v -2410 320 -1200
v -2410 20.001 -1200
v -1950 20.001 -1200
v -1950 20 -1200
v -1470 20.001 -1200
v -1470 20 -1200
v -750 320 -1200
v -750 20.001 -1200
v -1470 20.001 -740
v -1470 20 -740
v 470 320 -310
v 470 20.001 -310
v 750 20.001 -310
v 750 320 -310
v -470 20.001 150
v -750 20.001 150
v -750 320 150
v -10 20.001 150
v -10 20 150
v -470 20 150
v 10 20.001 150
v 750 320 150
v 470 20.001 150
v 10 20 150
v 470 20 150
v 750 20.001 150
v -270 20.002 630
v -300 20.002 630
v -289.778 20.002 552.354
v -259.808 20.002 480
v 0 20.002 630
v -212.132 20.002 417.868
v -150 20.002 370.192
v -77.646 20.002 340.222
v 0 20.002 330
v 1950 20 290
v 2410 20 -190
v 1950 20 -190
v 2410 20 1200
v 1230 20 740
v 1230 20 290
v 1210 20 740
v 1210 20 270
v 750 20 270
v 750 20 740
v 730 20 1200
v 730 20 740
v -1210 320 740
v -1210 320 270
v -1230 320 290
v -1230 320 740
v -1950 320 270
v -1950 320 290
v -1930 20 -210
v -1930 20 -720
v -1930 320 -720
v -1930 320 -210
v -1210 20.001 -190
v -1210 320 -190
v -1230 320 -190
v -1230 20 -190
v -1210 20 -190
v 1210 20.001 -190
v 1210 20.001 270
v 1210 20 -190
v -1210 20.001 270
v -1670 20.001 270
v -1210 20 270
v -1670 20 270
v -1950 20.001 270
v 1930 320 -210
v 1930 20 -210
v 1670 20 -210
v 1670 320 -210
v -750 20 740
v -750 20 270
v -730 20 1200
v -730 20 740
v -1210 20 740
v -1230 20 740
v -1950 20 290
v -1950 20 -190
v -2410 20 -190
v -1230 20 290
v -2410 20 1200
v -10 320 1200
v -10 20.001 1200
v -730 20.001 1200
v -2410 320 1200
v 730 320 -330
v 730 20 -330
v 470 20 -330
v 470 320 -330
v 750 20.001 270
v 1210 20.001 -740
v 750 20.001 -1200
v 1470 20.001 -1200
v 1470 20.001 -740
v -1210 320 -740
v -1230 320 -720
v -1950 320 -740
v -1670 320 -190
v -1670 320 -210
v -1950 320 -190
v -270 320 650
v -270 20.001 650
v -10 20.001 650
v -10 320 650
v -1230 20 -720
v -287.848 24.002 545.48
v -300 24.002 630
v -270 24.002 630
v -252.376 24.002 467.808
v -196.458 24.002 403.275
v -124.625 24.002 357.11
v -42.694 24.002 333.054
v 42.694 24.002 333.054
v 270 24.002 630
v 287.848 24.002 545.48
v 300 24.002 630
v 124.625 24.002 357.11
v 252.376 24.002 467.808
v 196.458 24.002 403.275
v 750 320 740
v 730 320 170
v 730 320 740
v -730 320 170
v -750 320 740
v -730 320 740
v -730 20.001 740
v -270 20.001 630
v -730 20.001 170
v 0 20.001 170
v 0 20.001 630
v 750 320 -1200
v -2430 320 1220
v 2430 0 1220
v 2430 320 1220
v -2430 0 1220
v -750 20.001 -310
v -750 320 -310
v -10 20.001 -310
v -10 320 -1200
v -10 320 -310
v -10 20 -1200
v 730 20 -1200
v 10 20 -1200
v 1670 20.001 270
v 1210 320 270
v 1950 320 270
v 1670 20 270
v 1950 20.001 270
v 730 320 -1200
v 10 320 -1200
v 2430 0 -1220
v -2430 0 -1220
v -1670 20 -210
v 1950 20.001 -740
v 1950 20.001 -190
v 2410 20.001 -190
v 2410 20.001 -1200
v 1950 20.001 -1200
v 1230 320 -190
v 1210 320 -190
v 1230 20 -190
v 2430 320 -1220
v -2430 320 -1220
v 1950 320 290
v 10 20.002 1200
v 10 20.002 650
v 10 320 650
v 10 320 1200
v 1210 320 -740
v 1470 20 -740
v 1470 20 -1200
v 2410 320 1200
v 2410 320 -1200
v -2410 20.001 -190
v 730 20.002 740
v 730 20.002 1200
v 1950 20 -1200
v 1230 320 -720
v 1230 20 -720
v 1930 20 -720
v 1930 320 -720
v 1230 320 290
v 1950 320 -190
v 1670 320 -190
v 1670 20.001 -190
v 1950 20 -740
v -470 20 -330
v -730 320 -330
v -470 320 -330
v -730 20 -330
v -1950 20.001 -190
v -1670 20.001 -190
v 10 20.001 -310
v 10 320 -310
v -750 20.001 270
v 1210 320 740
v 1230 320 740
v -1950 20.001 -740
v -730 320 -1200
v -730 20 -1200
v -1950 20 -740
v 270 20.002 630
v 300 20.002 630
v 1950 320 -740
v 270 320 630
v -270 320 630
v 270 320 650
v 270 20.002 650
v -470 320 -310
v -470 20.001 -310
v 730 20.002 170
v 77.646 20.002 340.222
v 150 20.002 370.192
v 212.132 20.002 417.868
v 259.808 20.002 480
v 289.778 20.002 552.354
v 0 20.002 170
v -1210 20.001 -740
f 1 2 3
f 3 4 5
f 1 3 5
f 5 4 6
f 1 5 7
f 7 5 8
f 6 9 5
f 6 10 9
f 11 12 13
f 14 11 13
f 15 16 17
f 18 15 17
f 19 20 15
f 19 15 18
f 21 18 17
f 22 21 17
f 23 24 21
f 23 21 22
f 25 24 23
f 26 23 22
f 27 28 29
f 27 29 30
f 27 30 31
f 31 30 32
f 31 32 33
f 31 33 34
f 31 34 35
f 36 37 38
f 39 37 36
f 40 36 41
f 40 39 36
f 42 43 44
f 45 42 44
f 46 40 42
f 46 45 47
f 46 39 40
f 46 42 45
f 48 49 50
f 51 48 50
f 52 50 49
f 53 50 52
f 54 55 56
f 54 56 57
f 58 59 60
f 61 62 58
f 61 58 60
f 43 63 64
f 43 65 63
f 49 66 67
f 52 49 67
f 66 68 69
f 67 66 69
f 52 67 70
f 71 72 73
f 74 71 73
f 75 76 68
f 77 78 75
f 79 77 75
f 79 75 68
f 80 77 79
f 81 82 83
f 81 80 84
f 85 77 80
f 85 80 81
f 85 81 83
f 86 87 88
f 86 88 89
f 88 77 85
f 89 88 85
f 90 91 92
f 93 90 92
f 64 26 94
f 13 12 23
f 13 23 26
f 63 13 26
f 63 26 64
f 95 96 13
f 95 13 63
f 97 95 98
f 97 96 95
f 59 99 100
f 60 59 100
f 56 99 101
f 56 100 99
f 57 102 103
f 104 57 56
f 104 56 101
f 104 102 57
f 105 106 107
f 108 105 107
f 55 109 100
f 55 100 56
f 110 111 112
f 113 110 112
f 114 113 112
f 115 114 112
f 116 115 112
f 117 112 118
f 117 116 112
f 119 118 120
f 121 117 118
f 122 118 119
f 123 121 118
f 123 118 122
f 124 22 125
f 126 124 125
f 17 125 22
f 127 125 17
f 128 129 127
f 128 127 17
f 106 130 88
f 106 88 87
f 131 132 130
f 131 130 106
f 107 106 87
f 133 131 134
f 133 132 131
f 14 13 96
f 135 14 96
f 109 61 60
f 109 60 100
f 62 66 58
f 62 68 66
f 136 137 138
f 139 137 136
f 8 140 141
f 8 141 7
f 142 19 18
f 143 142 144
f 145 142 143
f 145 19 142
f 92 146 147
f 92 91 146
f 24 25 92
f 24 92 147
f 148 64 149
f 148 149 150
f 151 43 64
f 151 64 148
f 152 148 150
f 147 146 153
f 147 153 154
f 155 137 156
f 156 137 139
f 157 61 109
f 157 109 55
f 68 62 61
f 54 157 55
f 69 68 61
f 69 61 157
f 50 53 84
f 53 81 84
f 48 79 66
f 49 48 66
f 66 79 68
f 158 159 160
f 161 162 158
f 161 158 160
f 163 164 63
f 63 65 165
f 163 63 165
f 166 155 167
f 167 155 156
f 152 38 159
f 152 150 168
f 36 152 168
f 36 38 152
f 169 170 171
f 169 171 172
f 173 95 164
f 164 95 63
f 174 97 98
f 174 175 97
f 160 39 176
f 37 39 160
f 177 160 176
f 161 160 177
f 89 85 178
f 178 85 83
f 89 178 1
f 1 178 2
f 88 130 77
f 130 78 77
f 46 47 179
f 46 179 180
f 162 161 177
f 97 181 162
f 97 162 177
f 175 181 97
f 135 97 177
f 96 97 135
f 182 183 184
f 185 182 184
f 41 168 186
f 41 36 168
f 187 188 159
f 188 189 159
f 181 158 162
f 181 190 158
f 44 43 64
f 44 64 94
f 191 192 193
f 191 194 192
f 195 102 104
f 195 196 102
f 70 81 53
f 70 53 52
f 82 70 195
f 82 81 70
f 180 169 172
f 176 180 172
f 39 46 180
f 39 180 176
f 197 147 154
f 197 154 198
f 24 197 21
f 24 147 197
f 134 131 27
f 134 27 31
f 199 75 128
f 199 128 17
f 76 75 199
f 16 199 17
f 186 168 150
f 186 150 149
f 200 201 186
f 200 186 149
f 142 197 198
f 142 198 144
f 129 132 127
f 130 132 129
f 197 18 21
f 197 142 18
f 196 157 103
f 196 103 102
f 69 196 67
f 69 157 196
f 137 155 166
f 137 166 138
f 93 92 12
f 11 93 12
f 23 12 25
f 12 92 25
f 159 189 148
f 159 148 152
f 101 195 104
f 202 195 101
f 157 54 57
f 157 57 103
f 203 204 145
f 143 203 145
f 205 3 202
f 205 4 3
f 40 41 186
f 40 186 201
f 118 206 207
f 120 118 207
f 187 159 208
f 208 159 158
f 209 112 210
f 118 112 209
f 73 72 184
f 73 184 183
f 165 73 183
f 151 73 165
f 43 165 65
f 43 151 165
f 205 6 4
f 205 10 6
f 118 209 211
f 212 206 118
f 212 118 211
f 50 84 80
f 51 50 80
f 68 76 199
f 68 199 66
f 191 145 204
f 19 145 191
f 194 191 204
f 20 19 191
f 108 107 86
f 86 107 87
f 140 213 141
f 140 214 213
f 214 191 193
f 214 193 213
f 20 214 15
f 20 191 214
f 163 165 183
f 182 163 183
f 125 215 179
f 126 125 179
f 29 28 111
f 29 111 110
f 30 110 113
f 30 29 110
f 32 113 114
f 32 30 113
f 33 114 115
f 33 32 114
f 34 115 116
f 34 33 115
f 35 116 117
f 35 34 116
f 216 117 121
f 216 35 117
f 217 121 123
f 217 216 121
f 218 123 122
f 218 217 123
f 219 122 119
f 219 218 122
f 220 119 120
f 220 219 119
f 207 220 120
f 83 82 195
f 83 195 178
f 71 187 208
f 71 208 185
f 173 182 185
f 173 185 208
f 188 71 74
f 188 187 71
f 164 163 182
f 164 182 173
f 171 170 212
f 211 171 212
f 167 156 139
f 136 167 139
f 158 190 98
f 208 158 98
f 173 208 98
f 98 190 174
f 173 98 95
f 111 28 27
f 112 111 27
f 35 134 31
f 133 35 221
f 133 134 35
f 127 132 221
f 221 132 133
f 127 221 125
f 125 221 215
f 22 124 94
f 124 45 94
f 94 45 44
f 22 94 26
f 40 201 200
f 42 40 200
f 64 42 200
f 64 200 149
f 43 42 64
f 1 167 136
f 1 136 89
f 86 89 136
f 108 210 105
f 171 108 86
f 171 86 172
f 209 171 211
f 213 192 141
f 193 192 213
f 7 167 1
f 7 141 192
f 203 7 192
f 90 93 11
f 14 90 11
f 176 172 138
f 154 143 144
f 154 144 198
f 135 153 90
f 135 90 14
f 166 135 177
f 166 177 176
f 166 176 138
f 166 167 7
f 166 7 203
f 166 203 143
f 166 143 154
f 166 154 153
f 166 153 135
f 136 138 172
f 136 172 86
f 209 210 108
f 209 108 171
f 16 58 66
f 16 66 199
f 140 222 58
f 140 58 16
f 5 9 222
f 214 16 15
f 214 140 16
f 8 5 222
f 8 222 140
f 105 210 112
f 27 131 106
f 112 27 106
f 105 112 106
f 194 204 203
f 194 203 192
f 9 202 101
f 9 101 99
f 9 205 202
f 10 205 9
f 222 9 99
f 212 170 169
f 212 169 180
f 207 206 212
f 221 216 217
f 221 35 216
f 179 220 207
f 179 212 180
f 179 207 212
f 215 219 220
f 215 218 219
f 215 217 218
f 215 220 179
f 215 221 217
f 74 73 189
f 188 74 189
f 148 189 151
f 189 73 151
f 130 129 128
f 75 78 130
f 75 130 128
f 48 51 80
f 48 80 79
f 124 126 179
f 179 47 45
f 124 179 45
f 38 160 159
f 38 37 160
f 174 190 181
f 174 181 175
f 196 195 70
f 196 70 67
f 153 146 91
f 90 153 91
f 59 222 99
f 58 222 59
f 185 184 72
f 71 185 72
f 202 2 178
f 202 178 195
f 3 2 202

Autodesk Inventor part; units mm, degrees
ref_plane "YZ Plane" through (0, 0, 0) normal (1, 0, 0) x (0, 1, 0)
ref_plane "XY Plane" through (0, 0, 0) normal (0, 0, 1) x (1, 0, 0)
sketch "Sketch1" plane through (0, 0, 0) normal (0, 1, 0) x (-1, 0, 0)
  line L0 (2430, 1220) -> (0, 1220)
  line L1 (0, -1220) -> (2430, -1220)
  line L2 (2430, -1220) -> (2430, 1220)
  line L3 (2410, 1200) -> (2410, -1200)
  line L4 (10, 650) -> (10, 1200)
  line L5 (740, 150) -> (0, 150)
  line L6 (730, 170) -> (730, 740)
  line L7 (730, 740) -> (750, 740)
  line L8 (750, 740) -> (750, 150)
  line L9 (750, 150) -> (740, 150)
  line L10 (1210, 740) -> (1210, 270)
  line L11 (1230, 290) -> (1230, 740)
  line L12 (1230, 740) -> (1210, 740)
  line L13 (270, 630) -> (270, 650)
  line L14 (10, 1200) -> (2410, 1200)
  line L15 (0, -330) -> (10, -330)
  line L16 (0, -330) -> (10, -330) construction
  line L17 (10, -330) -> (10, -1200)
  line L18 (730, -1200) -> (730, -330)
  line L19 (750, -1200) -> (1600, -1200) construction
  line L20 (730, -330) -> (470, -330)
  line L21 (470, -330) -> (470, -310)
  line L22 (470, -310) -> (750, -310)
  line L23 (750, -310) -> (750, -1200)
  line L24 (2410, -1200) -> (750, -1200)
  line L25 (730, -1200) -> (10, -1200)
  line L26 (0, -1200) -> (730, -1200) construction
  line L27 (750, -1200) -> (870, -1200) construction
  line L28 (1210, 270) -> (1950, 270)
  line L29 (1210, 270) -> (1950, 270) construction
  line L30 (1950, 270) -> (1950, 290)
  line L31 (1950, 290) -> (1230, 290)
  line L32 (1950, -190) -> (1950, -740)
  line L33 (1950, -740) -> (1210, -740)
  line L34 (1210, -740) -> (1210, -190)
  line L35 (1210, -190) -> (1230, -190)
  line L36 (1210, -190) -> (1230, -190) construction
  line L37 (1230, -190) -> (1230, -720)
  line L38 (1230, -720) -> (1930, -720)
  line L39 (1930, -720) -> (1930, -210)
  line L40 (1930, -210) -> (1670, -210)
  line L41 (1670, -210) -> (1670, -190)
  line L42 (1670, -190) -> (1950, -190)
  line L43 (-2430, 1220) -> (0, 1220)
  line L44 (0, -1220) -> (-2430, -1220)
  line L45 (-2430, -1220) -> (-2430, 1220)
  line L46 (-2410, 1200) -> (-2410, -1200)
  line L47 (-10, 650) -> (-10, 1200)
  line L48 (-740, 150) -> (0, 150)
  line L49 (-730, 170) -> (-730, 740)
  line L50 (-730, 740) -> (-750, 740)
  line L51 (-750, 740) -> (-750, 150)
  line L52 (-750, 150) -> (-740, 150)
  line L53 (-1210, 740) -> (-1210, 270)
  line L54 (-1230, 290) -> (-1230, 740)
  line L55 (-1230, 740) -> (-1210, 740)
  line L56 (-270, 630) -> (-270, 650)
  line L57 (-10, 1200) -> (-2410, 1200)
  line L58 (0, -330) -> (-10, -330)
  line L59 (0, -330) -> (-10, -330) construction
  line L60 (-10, -330) -> (-10, -1200)
  line L61 (-730, -1200) -> (-730, -330)
  line L62 (-750, -1200) -> (-1600, -1200) construction
  line L63 (-730, -330) -> (-470, -330)
  line L64 (-470, -330) -> (-470, -310)
  line L65 (-470, -310) -> (-750, -310)
  line L66 (-750, -310) -> (-750, -1200)
  line L67 (-2410, -1200) -> (-750, -1200)
  line L68 (-730, -1200) -> (-10, -1200)
  line L69 (0, -1200) -> (-730, -1200) construction
  line L70 (-750, -1200) -> (-870, -1200) construction
  line L71 (-1210, 270) -> (-1950, 270)
  line L72 (-1210, 270) -> (-1950, 270) construction
  line L73 (-1950, 270) -> (-1950, 290)
  line L74 (-1950, 290) -> (-1230, 290)
  line L75 (-1950, -190) -> (-1950, -740)
  line L76 (-1950, -740) -> (-1210, -740)
  line L77 (-1210, -740) -> (-1210, -190)
  line L78 (-1210, -190) -> (-1230, -190)
  line L79 (-1210, -190) -> (-1230, -190) construction
  line L80 (-1230, -190) -> (-1230, -720)
  line L81 (-1230, -720) -> (-1930, -720)
  line L82 (-1930, -720) -> (-1930, -210)
  line L83 (-1930, -210) -> (-1670, -210)
  line L84 (-1670, -210) -> (-1670, -190)
  line L85 (-1670, -190) -> (-1950, -190)
  line L86 (270, 630) -> (-270, 630)
  line L87 (270, 650) -> (10, 650)
  line L88 (-10, 650) -> (-270, 650)
  line L89 (730, 170) -> (-730, 170)
  point P0 (0, 0)
  dimension "d274" = 4860
  dimension "d275" = 2440
  dimension "d276" = 2400
  dimension "d277" = 2400
  dimension "d278" = 720
  dimension "d279" = 450
  dimension "d280" = 20
  dimension "d281" = 470
  dimension "d282" = 740
  dimension "d283" = 20
  dimension "d284" = 700
  dimension "d285" = 510
  dimension "d286" = 260
  dimension "d287" = 20
  dimension "d288" = 280
  dimension "d289" = 550
  dimension "d290" = 740
  dimension "d291" = 550
  dimension "d292" = 20
  dimension "d293" = 530
  dimension "d294" = 890
  dimension "d295" = 280
  dimension "d296" = 20
  dimension "d297" = 260
  dimension "d298" = 870
  dimension "d300" = 870
  dimension "d301" = 20
  dimension "d302" = 550
  dimension "d303" = 260
  dimension "d304" = 20
  dimension "d305" = 540
  dimension "d306" = 570
  dimension "d307" = 20
  dimension "d308" = 590
  dimension "d309" = 1500
  dimension "d310" = 1460
  dimension "d311" = 2400
  dimension "d312" = 20
  dimension "d313" = 20
  dimension "d314" = 20
  dimension "d315" = 20
  dimension "d316" = 20
  dimension "d318" = 1660
  dimension "d319" = 20
  dimension "d320" = 720
  dimension "d324" = 20
  dimension "d330" = 720
  dimension "d331" = 740
  dimension "d332" = 470
  dimension "d333" = 20
  dimension "d334" = 20
  dimension "d336" = 530
  dimension "d337" = 510
  dimension "d338" = 260
  dimension "d339" = 20
  dimension "d341" = 550
  dimension "d343" = 550
  dimension "d346" = 870
  dimension "d352" = 460
  dimension "d353" = 460
  dimension "d356" = 460
  dimension "d358" = 460
  dimension "d359" = 460
  dimension "d364" = 460
extrude "Extrusion1" add sketch "Sketch1" along normal blind 20 contours L3 L24 L23 L22 L21 L20 L18 L25 L17 L15 L58 L60 L68 L61 L63 L64 L65 L66 L67 L46 L57 L47 L88 L56 L86 L13 L87 L4 L14
extrude "Extrusion2" add sketch "Sketch1" along normal blind 320
sketch "Sketch3" plane through (0, 20, 0) normal (0, 1, 0) x (1, 0, 0)
  line L0 (-2410, 1200) -> (-1950, 1200)
  line L1 (-1950, 1200) -> (-1950, 190)
  line L2 (-1950, 190) -> (-2410, 190)
  line L3 (-2410, 190) -> (-2410, 1200)
  line L4 (-1950, -270) -> (-1210, -270) projected
  line L5 (-1950, 190) -> (-1670, 190)
  line L6 (-1670, 190) -> (-1670, -270)
  line L7 (-1670, -270) -> (-1950, -270)
  line L8 (-1950, -270) -> (-1950, 190)
  line L9 (-750, 1200) -> (-2410, 1200) projected
  line L10 (-1210, 1200) -> (-750, 1200)
  line L11 (-750, 1200) -> (-750, -270)
  line L12 (-750, -270) -> (-1210, -270)
  line L13 (-1210, -270) -> (-1210, 1200)
  line L14 (-470, 310) -> (-750, 310)
  line L15 (-750, 310) -> (-750, -150)
  line L16 (-750, -150) -> (-470, -150)
  line L17 (-470, -150) -> (-470, 310)
  line L18 (-2410, 1200) -> (-750, 1200) projected
  line L19 (-1210, 740) -> (-1470, 740)
  line L20 (-1470, 740) -> (-1470, 1200)
  line L21 (-1470, 1200) -> (-1210, 1200)
  line L22 (-1210, 1200) -> (-1210, 740)
  line L23 (-10, -1200) -> (-2410, -1200) projected
  line L24 (-10, -650) -> (-730, -650)
  line L25 (-730, -650) -> (-730, -1200)
  line L26 (-730, -1200) -> (-10, -1200)
  line L27 (-10, -1200) -> (-10, -650)
  line L28 (-270, -632.8872) -> (-270, -650)
  line L29 (-270, -650) -> (-730, -650)
  line L30 (-730, -650) -> (-730, -632.8872)
  line L31 (270, -630) -> (-270, -630) projected
  line L32 (-730, -170) -> (0, -170)
  line L33 (0, -170) -> (0, -630)
  line L34 (0, -630) -> (-730, -630)
  line L35 (-730, -630) -> (-730, -170)
  line L36 (-270, -630) -> (-730, -630)
  line L37 (-730, -630) -> (-730, -650)
  line L38 (-730, -650) -> (-270, -650)
  line L39 (-270, -650) -> (-270, -630)
  point P0 (0, 0)
  dimension "d181" = 260
extrude "Extrusion3" add sketch "Sketch3" along normal blind 0.001 contours L0 L1 L2 L3 | L5 L6 L4 L8 | L9 L13 L19 L20 | L9 L11 L12 L13 | L14 L17 L16 L11 | L23 L25 L24 L27 | L30 L37 L34 L39 L28 L24 | L35 L32 L33 L31 L34
mirror "Mirror1" about plane through (0, 0, 0) normal (1, 0, 0) of "Extrusion3"
sketch "Sketch4" plane through (0, 20.001, 0) normal (0, 1, 0) x (1, 0, 0)
  line L0 (-730, -170) -> (730, -170) projected
  line L1 (730, -170) -> (730, -740) projected
  line L2 (0, -170) -> (730, -170)
  line L3 (730, -170) -> (730, -630)
  line L4 (730, -630) -> (0, -630)
  line L5 (0, -630) -> (0, -170)
  line L6 (10, -650) -> (730, -650)
  line L7 (730, -650) -> (730, -1200)
  line L8 (730, -1200) -> (10, -1200)
  line L9 (10, -1200) -> (10, -650)
  line L10 (270, -630) -> (730, -630)
  line L11 (730, -630) -> (730, -650)
  line L12 (730, -650) -> (270, -650)
  line L13 (270, -650) -> (270, -630)
  point P0 (0, 0)
  dimension "d185" = 460
extrude "Extrusion4" add sketch "Sketch4" along normal blind 0.001
sketch "Sketch5" plane through (0, 20, 0) normal (0, 1, 0) x (1, 0, 0)
  line L0 (-10, 330) -> (10, 330)
  line L1 (-470, -150) -> (470, -150) projected
  line L2 (10, -130) -> (10, -150)
  line L3 (10, -150) -> (-10, -150)
  line L4 (-10, -150) -> (-10, -130)
  line L5 (-10, 330) -> (10, 330)
  line L6 (10, 330) -> (10, 310)
  line L7 (10, 310) -> (-10, 310)
  line L8 (-10, 310) -> (-10, 330)
  line L9 (-10, 310) -> (10, 310)
  line L10 (10, 310) -> (10, -150)
  line L11 (10, -150) -> (-10, -150)
  line L12 (-10, -150) -> (-10, 310)
  point P0 (0, 0)
  dimension "d190" = 20
  dimension "d193" = 20
  dimension "d194" = 460
extrude "Extrusion5" add sketch "Sketch5" along normal blind 300 contours L0 L6 L7 L8
extrude "Extrusion6" add sketch "Sketch5" along normal blind 0.001 contours L7 L10 L2 L1 L4 L12
sketch "Sketch6" plane through (0, 20.002, 0) normal (0, 1, 0) x (1, 0, 0)
  arc A0 (300, -630) -> (-300, -630) centre (0, -630) ccw
  line L0 (-300, -630) -> (300, -630)
  point P0 (0, 0)
  dimension "d197" = 600
extrude "Extrusion7" add sketch "Sketch6" along normal blind 4
ref_plane "Work Plane1" through (0, 20, 0) normal (0, 1, 0) x (-1, 0, 0)
properties part number "Lapangan"
